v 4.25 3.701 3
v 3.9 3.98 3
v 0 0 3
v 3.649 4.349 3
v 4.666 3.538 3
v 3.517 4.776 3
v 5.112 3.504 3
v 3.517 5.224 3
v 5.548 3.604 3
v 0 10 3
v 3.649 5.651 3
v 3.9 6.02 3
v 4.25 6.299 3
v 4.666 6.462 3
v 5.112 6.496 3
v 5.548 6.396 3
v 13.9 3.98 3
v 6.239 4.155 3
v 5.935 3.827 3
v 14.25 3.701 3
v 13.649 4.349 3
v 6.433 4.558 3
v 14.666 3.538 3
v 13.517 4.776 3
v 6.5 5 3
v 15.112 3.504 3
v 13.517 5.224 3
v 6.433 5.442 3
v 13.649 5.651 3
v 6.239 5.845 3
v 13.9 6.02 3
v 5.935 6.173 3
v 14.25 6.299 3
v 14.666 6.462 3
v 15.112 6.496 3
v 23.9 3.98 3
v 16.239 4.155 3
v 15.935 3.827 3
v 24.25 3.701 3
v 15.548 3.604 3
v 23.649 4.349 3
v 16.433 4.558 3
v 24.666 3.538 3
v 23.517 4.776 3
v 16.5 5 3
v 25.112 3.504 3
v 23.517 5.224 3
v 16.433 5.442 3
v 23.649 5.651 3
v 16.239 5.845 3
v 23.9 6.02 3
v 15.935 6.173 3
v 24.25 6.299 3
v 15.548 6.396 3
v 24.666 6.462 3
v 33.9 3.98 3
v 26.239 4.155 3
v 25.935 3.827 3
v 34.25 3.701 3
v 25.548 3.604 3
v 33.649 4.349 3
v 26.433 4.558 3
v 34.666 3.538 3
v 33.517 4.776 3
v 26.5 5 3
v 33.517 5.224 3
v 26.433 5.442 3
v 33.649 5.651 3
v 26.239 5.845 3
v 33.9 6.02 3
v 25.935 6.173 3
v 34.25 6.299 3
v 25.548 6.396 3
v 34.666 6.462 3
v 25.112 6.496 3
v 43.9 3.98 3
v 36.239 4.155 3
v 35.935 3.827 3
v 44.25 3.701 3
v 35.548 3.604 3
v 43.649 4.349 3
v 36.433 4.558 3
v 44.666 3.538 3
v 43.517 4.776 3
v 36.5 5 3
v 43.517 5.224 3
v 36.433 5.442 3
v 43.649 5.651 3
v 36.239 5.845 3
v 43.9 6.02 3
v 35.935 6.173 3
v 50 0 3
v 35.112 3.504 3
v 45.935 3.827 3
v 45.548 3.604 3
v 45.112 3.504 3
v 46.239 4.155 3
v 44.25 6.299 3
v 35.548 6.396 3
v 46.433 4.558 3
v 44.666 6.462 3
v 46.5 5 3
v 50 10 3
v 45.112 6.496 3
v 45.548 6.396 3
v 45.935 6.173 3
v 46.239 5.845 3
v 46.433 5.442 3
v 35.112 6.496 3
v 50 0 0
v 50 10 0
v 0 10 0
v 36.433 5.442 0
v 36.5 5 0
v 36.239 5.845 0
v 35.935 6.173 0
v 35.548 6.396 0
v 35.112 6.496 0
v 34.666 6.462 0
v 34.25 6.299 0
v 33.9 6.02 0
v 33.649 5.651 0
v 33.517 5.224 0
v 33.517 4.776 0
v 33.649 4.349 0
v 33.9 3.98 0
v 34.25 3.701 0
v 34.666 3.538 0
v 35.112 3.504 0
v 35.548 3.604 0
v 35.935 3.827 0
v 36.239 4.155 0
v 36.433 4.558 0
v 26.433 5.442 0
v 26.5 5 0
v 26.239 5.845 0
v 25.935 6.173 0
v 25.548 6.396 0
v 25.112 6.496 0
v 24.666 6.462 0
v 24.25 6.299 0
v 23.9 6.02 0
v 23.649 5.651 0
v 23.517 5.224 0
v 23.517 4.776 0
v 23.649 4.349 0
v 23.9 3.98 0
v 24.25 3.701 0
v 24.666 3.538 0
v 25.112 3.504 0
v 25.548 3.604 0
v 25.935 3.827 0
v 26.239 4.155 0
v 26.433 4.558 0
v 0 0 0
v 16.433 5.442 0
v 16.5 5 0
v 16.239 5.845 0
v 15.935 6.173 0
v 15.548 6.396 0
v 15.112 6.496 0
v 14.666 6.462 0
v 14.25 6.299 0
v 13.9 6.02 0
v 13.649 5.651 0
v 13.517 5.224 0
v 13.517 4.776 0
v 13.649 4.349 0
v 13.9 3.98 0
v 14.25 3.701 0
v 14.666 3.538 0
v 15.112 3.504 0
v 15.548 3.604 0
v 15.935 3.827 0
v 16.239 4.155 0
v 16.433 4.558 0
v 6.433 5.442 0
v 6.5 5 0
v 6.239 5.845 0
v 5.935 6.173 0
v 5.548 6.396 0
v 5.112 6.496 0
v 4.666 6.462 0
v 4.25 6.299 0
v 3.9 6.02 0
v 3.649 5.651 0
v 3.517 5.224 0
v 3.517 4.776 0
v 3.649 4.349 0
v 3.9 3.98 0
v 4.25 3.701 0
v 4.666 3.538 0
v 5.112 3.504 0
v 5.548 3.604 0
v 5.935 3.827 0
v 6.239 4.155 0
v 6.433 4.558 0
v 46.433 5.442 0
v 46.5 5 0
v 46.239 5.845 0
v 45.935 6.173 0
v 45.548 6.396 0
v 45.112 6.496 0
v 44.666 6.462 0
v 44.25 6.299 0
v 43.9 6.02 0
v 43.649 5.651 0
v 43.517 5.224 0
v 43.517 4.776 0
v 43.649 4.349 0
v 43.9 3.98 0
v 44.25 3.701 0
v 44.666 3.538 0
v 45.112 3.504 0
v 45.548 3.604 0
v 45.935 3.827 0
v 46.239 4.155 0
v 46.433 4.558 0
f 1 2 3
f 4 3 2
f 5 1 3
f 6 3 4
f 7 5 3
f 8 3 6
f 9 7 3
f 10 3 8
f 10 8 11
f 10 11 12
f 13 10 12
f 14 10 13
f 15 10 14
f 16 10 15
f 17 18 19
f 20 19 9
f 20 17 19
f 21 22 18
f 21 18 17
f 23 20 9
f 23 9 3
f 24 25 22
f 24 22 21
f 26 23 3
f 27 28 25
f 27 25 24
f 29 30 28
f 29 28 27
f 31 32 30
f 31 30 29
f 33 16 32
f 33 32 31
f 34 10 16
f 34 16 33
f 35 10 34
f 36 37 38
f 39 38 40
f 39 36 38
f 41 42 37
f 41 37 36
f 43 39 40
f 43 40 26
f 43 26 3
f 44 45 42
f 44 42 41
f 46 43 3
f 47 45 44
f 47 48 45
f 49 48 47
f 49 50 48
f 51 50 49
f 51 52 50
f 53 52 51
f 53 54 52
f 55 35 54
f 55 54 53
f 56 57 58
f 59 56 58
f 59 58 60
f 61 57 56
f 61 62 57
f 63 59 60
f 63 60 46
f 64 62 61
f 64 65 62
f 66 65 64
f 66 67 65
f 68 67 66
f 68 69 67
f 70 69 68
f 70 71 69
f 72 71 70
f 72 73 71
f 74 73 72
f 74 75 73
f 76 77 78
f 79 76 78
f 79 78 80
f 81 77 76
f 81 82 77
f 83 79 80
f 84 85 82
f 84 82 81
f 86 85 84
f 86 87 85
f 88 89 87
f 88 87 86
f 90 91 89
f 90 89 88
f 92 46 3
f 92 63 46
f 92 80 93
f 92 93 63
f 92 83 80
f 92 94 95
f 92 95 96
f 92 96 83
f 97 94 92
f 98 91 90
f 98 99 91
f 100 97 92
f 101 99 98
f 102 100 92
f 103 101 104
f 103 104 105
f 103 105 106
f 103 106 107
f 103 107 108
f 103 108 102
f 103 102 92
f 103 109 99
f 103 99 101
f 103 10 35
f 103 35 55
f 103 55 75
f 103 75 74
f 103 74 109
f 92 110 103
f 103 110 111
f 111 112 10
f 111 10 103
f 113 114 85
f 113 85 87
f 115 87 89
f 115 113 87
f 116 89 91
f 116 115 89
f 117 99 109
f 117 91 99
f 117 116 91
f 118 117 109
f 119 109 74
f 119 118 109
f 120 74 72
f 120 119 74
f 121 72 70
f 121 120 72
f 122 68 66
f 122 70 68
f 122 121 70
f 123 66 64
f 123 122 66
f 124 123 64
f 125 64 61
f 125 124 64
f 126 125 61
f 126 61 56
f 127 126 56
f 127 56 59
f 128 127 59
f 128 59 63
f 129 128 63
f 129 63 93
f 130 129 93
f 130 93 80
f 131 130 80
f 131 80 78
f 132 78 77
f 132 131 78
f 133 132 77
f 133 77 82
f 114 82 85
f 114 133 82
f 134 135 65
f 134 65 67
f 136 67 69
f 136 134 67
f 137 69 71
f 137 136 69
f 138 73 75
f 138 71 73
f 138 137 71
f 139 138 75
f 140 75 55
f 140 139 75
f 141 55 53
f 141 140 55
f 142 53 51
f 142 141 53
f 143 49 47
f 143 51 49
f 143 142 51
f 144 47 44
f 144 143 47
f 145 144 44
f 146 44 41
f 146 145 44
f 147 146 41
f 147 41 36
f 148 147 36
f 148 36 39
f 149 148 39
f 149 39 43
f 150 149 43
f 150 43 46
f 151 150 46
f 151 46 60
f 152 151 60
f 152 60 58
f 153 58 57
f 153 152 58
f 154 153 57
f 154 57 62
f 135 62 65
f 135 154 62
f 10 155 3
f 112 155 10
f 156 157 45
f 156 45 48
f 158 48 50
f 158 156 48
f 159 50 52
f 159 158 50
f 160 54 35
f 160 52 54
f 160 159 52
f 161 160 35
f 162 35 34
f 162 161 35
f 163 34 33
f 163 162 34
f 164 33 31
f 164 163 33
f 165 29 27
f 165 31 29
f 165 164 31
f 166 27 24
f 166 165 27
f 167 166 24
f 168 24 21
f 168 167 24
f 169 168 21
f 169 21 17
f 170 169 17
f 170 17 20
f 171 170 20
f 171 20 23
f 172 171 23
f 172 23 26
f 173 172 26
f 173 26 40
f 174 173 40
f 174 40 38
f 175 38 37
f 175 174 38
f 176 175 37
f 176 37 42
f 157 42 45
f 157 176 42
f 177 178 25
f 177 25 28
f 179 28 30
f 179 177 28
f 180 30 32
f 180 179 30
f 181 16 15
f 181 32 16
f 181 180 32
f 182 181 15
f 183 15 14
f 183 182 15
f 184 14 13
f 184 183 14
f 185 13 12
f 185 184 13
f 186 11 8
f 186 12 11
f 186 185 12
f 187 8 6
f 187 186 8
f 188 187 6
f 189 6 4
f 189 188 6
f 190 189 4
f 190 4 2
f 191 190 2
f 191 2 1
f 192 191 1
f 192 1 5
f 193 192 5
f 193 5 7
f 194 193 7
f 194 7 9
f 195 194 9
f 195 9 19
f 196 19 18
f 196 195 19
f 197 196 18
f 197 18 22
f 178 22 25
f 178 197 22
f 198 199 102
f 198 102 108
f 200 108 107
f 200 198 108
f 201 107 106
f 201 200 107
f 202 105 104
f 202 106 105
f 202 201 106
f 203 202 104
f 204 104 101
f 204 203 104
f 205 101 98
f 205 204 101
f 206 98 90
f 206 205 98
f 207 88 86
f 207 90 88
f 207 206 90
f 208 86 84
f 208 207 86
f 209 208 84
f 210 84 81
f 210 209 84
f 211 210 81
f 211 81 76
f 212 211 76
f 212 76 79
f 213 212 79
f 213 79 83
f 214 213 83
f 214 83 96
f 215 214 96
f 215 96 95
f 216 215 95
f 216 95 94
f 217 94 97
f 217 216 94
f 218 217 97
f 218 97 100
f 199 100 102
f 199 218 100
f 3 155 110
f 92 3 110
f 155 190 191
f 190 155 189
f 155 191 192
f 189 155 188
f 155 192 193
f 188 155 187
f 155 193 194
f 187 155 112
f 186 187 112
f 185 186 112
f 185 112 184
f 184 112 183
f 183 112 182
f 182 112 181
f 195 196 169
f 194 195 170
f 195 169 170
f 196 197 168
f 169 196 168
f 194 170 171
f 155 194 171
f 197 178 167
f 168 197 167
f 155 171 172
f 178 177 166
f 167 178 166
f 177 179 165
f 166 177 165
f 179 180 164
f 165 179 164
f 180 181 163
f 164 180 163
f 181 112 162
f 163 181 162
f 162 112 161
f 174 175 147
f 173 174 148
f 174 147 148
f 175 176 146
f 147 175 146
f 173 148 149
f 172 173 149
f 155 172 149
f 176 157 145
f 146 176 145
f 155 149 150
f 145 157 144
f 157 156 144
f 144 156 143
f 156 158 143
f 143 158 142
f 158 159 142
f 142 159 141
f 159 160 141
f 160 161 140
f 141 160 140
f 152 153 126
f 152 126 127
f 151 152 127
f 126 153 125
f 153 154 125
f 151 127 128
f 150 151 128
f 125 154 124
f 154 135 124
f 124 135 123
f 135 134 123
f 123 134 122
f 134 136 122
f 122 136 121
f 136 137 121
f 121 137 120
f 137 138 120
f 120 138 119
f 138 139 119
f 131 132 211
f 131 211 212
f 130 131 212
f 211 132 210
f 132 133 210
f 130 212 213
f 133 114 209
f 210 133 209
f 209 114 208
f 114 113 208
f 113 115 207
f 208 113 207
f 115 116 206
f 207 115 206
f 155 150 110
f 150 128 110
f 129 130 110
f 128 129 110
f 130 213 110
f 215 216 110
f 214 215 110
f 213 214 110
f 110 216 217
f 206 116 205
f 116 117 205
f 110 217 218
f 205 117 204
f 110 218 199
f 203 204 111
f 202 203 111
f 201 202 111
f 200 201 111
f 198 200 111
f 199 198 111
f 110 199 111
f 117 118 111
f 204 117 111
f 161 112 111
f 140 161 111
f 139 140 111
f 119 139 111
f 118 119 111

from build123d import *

# Parameters (mm, degrees)
CYLINDER004_R     = 1.5
CYLINDER004_DEPTH = 10
CYLINDER003_R     = 1.5
CYLINDER003_DEPTH = 10
CYLINDER002_R     = 1.5
CYLINDER002_DEPTH = 10
CYLINDER001_R     = 1.5
CYLINDER001_DEPTH = 10
CYLINDER_R        = 1.5
CYLINDER_DEPTH    = 10
BOX_W             = 50
BOX_H             = 10
BOX_DEPTH         = 3


with BuildPart() as cilindro004:
    # Cylinder004 → Cylinder004 (new body)
    with BuildSketch(Plane(origin=(45, 5, -1), x_dir=(1, 0, 0), z_dir=(0, 0, 1))):
        Circle(CYLINDER004_R)
    extrude(amount=CYLINDER004_DEPTH)


with BuildPart() as cilindro003:
    # Cylinder003 → Cylinder003 (new body)
    with BuildSketch(Plane(origin=(35, 5, -1), x_dir=(1, 0, 0), z_dir=(0, 0, 1))):
        Circle(CYLINDER003_R)
    extrude(amount=CYLINDER003_DEPTH)


with BuildPart() as cilindro002:
    # Cylinder002 → Cylinder002 (new body)
    with BuildSketch(Plane(origin=(25, 5, -1), x_dir=(1, 0, 0), z_dir=(0, 0, 1))):
        Circle(CYLINDER002_R)
    extrude(amount=CYLINDER002_DEPTH)


with BuildPart() as cilindro001:
    # Cylinder001 → Cylinder001 (new body)
    with BuildSketch(Plane(origin=(15, 5, -1), x_dir=(1, 0, 0), z_dir=(0, 0, 1))):
        Circle(CYLINDER001_R)
    extrude(amount=CYLINDER001_DEPTH)


with BuildPart() as cilindro:
    # Cylinder → Cylinder (new body)
    with BuildSketch(Plane(origin=(5, 5, -1), x_dir=(1, 0, 0), z_dir=(0, 0, 1))):
        Circle(CYLINDER_R)
    extrude(amount=CYLINDER_DEPTH)


with BuildPart() as cut004:
    # Box → Box (new body)
    with BuildSketch(Plane.XY):
        with Locations((25, 5)):
            Rectangle(BOX_W, BOX_H)
    extrude(amount=BOX_DEPTH)

    # Cut: cut Cilindro
    add(cilindro.part, mode=Mode.SUBTRACT)

    # Cut001: cut Cilindro001
    add(cilindro001.part, mode=Mode.SUBTRACT)

    # Cut002: cut Cilindro002
    add(cilindro002.part, mode=Mode.SUBTRACT)

    # Cut003: cut Cilindro003
    add(cilindro003.part, mode=Mode.SUBTRACT)

    # Cut004: cut Cilindro004
    add(cilindro004.part, mode=Mode.SUBTRACT)


solid = cut004.part
